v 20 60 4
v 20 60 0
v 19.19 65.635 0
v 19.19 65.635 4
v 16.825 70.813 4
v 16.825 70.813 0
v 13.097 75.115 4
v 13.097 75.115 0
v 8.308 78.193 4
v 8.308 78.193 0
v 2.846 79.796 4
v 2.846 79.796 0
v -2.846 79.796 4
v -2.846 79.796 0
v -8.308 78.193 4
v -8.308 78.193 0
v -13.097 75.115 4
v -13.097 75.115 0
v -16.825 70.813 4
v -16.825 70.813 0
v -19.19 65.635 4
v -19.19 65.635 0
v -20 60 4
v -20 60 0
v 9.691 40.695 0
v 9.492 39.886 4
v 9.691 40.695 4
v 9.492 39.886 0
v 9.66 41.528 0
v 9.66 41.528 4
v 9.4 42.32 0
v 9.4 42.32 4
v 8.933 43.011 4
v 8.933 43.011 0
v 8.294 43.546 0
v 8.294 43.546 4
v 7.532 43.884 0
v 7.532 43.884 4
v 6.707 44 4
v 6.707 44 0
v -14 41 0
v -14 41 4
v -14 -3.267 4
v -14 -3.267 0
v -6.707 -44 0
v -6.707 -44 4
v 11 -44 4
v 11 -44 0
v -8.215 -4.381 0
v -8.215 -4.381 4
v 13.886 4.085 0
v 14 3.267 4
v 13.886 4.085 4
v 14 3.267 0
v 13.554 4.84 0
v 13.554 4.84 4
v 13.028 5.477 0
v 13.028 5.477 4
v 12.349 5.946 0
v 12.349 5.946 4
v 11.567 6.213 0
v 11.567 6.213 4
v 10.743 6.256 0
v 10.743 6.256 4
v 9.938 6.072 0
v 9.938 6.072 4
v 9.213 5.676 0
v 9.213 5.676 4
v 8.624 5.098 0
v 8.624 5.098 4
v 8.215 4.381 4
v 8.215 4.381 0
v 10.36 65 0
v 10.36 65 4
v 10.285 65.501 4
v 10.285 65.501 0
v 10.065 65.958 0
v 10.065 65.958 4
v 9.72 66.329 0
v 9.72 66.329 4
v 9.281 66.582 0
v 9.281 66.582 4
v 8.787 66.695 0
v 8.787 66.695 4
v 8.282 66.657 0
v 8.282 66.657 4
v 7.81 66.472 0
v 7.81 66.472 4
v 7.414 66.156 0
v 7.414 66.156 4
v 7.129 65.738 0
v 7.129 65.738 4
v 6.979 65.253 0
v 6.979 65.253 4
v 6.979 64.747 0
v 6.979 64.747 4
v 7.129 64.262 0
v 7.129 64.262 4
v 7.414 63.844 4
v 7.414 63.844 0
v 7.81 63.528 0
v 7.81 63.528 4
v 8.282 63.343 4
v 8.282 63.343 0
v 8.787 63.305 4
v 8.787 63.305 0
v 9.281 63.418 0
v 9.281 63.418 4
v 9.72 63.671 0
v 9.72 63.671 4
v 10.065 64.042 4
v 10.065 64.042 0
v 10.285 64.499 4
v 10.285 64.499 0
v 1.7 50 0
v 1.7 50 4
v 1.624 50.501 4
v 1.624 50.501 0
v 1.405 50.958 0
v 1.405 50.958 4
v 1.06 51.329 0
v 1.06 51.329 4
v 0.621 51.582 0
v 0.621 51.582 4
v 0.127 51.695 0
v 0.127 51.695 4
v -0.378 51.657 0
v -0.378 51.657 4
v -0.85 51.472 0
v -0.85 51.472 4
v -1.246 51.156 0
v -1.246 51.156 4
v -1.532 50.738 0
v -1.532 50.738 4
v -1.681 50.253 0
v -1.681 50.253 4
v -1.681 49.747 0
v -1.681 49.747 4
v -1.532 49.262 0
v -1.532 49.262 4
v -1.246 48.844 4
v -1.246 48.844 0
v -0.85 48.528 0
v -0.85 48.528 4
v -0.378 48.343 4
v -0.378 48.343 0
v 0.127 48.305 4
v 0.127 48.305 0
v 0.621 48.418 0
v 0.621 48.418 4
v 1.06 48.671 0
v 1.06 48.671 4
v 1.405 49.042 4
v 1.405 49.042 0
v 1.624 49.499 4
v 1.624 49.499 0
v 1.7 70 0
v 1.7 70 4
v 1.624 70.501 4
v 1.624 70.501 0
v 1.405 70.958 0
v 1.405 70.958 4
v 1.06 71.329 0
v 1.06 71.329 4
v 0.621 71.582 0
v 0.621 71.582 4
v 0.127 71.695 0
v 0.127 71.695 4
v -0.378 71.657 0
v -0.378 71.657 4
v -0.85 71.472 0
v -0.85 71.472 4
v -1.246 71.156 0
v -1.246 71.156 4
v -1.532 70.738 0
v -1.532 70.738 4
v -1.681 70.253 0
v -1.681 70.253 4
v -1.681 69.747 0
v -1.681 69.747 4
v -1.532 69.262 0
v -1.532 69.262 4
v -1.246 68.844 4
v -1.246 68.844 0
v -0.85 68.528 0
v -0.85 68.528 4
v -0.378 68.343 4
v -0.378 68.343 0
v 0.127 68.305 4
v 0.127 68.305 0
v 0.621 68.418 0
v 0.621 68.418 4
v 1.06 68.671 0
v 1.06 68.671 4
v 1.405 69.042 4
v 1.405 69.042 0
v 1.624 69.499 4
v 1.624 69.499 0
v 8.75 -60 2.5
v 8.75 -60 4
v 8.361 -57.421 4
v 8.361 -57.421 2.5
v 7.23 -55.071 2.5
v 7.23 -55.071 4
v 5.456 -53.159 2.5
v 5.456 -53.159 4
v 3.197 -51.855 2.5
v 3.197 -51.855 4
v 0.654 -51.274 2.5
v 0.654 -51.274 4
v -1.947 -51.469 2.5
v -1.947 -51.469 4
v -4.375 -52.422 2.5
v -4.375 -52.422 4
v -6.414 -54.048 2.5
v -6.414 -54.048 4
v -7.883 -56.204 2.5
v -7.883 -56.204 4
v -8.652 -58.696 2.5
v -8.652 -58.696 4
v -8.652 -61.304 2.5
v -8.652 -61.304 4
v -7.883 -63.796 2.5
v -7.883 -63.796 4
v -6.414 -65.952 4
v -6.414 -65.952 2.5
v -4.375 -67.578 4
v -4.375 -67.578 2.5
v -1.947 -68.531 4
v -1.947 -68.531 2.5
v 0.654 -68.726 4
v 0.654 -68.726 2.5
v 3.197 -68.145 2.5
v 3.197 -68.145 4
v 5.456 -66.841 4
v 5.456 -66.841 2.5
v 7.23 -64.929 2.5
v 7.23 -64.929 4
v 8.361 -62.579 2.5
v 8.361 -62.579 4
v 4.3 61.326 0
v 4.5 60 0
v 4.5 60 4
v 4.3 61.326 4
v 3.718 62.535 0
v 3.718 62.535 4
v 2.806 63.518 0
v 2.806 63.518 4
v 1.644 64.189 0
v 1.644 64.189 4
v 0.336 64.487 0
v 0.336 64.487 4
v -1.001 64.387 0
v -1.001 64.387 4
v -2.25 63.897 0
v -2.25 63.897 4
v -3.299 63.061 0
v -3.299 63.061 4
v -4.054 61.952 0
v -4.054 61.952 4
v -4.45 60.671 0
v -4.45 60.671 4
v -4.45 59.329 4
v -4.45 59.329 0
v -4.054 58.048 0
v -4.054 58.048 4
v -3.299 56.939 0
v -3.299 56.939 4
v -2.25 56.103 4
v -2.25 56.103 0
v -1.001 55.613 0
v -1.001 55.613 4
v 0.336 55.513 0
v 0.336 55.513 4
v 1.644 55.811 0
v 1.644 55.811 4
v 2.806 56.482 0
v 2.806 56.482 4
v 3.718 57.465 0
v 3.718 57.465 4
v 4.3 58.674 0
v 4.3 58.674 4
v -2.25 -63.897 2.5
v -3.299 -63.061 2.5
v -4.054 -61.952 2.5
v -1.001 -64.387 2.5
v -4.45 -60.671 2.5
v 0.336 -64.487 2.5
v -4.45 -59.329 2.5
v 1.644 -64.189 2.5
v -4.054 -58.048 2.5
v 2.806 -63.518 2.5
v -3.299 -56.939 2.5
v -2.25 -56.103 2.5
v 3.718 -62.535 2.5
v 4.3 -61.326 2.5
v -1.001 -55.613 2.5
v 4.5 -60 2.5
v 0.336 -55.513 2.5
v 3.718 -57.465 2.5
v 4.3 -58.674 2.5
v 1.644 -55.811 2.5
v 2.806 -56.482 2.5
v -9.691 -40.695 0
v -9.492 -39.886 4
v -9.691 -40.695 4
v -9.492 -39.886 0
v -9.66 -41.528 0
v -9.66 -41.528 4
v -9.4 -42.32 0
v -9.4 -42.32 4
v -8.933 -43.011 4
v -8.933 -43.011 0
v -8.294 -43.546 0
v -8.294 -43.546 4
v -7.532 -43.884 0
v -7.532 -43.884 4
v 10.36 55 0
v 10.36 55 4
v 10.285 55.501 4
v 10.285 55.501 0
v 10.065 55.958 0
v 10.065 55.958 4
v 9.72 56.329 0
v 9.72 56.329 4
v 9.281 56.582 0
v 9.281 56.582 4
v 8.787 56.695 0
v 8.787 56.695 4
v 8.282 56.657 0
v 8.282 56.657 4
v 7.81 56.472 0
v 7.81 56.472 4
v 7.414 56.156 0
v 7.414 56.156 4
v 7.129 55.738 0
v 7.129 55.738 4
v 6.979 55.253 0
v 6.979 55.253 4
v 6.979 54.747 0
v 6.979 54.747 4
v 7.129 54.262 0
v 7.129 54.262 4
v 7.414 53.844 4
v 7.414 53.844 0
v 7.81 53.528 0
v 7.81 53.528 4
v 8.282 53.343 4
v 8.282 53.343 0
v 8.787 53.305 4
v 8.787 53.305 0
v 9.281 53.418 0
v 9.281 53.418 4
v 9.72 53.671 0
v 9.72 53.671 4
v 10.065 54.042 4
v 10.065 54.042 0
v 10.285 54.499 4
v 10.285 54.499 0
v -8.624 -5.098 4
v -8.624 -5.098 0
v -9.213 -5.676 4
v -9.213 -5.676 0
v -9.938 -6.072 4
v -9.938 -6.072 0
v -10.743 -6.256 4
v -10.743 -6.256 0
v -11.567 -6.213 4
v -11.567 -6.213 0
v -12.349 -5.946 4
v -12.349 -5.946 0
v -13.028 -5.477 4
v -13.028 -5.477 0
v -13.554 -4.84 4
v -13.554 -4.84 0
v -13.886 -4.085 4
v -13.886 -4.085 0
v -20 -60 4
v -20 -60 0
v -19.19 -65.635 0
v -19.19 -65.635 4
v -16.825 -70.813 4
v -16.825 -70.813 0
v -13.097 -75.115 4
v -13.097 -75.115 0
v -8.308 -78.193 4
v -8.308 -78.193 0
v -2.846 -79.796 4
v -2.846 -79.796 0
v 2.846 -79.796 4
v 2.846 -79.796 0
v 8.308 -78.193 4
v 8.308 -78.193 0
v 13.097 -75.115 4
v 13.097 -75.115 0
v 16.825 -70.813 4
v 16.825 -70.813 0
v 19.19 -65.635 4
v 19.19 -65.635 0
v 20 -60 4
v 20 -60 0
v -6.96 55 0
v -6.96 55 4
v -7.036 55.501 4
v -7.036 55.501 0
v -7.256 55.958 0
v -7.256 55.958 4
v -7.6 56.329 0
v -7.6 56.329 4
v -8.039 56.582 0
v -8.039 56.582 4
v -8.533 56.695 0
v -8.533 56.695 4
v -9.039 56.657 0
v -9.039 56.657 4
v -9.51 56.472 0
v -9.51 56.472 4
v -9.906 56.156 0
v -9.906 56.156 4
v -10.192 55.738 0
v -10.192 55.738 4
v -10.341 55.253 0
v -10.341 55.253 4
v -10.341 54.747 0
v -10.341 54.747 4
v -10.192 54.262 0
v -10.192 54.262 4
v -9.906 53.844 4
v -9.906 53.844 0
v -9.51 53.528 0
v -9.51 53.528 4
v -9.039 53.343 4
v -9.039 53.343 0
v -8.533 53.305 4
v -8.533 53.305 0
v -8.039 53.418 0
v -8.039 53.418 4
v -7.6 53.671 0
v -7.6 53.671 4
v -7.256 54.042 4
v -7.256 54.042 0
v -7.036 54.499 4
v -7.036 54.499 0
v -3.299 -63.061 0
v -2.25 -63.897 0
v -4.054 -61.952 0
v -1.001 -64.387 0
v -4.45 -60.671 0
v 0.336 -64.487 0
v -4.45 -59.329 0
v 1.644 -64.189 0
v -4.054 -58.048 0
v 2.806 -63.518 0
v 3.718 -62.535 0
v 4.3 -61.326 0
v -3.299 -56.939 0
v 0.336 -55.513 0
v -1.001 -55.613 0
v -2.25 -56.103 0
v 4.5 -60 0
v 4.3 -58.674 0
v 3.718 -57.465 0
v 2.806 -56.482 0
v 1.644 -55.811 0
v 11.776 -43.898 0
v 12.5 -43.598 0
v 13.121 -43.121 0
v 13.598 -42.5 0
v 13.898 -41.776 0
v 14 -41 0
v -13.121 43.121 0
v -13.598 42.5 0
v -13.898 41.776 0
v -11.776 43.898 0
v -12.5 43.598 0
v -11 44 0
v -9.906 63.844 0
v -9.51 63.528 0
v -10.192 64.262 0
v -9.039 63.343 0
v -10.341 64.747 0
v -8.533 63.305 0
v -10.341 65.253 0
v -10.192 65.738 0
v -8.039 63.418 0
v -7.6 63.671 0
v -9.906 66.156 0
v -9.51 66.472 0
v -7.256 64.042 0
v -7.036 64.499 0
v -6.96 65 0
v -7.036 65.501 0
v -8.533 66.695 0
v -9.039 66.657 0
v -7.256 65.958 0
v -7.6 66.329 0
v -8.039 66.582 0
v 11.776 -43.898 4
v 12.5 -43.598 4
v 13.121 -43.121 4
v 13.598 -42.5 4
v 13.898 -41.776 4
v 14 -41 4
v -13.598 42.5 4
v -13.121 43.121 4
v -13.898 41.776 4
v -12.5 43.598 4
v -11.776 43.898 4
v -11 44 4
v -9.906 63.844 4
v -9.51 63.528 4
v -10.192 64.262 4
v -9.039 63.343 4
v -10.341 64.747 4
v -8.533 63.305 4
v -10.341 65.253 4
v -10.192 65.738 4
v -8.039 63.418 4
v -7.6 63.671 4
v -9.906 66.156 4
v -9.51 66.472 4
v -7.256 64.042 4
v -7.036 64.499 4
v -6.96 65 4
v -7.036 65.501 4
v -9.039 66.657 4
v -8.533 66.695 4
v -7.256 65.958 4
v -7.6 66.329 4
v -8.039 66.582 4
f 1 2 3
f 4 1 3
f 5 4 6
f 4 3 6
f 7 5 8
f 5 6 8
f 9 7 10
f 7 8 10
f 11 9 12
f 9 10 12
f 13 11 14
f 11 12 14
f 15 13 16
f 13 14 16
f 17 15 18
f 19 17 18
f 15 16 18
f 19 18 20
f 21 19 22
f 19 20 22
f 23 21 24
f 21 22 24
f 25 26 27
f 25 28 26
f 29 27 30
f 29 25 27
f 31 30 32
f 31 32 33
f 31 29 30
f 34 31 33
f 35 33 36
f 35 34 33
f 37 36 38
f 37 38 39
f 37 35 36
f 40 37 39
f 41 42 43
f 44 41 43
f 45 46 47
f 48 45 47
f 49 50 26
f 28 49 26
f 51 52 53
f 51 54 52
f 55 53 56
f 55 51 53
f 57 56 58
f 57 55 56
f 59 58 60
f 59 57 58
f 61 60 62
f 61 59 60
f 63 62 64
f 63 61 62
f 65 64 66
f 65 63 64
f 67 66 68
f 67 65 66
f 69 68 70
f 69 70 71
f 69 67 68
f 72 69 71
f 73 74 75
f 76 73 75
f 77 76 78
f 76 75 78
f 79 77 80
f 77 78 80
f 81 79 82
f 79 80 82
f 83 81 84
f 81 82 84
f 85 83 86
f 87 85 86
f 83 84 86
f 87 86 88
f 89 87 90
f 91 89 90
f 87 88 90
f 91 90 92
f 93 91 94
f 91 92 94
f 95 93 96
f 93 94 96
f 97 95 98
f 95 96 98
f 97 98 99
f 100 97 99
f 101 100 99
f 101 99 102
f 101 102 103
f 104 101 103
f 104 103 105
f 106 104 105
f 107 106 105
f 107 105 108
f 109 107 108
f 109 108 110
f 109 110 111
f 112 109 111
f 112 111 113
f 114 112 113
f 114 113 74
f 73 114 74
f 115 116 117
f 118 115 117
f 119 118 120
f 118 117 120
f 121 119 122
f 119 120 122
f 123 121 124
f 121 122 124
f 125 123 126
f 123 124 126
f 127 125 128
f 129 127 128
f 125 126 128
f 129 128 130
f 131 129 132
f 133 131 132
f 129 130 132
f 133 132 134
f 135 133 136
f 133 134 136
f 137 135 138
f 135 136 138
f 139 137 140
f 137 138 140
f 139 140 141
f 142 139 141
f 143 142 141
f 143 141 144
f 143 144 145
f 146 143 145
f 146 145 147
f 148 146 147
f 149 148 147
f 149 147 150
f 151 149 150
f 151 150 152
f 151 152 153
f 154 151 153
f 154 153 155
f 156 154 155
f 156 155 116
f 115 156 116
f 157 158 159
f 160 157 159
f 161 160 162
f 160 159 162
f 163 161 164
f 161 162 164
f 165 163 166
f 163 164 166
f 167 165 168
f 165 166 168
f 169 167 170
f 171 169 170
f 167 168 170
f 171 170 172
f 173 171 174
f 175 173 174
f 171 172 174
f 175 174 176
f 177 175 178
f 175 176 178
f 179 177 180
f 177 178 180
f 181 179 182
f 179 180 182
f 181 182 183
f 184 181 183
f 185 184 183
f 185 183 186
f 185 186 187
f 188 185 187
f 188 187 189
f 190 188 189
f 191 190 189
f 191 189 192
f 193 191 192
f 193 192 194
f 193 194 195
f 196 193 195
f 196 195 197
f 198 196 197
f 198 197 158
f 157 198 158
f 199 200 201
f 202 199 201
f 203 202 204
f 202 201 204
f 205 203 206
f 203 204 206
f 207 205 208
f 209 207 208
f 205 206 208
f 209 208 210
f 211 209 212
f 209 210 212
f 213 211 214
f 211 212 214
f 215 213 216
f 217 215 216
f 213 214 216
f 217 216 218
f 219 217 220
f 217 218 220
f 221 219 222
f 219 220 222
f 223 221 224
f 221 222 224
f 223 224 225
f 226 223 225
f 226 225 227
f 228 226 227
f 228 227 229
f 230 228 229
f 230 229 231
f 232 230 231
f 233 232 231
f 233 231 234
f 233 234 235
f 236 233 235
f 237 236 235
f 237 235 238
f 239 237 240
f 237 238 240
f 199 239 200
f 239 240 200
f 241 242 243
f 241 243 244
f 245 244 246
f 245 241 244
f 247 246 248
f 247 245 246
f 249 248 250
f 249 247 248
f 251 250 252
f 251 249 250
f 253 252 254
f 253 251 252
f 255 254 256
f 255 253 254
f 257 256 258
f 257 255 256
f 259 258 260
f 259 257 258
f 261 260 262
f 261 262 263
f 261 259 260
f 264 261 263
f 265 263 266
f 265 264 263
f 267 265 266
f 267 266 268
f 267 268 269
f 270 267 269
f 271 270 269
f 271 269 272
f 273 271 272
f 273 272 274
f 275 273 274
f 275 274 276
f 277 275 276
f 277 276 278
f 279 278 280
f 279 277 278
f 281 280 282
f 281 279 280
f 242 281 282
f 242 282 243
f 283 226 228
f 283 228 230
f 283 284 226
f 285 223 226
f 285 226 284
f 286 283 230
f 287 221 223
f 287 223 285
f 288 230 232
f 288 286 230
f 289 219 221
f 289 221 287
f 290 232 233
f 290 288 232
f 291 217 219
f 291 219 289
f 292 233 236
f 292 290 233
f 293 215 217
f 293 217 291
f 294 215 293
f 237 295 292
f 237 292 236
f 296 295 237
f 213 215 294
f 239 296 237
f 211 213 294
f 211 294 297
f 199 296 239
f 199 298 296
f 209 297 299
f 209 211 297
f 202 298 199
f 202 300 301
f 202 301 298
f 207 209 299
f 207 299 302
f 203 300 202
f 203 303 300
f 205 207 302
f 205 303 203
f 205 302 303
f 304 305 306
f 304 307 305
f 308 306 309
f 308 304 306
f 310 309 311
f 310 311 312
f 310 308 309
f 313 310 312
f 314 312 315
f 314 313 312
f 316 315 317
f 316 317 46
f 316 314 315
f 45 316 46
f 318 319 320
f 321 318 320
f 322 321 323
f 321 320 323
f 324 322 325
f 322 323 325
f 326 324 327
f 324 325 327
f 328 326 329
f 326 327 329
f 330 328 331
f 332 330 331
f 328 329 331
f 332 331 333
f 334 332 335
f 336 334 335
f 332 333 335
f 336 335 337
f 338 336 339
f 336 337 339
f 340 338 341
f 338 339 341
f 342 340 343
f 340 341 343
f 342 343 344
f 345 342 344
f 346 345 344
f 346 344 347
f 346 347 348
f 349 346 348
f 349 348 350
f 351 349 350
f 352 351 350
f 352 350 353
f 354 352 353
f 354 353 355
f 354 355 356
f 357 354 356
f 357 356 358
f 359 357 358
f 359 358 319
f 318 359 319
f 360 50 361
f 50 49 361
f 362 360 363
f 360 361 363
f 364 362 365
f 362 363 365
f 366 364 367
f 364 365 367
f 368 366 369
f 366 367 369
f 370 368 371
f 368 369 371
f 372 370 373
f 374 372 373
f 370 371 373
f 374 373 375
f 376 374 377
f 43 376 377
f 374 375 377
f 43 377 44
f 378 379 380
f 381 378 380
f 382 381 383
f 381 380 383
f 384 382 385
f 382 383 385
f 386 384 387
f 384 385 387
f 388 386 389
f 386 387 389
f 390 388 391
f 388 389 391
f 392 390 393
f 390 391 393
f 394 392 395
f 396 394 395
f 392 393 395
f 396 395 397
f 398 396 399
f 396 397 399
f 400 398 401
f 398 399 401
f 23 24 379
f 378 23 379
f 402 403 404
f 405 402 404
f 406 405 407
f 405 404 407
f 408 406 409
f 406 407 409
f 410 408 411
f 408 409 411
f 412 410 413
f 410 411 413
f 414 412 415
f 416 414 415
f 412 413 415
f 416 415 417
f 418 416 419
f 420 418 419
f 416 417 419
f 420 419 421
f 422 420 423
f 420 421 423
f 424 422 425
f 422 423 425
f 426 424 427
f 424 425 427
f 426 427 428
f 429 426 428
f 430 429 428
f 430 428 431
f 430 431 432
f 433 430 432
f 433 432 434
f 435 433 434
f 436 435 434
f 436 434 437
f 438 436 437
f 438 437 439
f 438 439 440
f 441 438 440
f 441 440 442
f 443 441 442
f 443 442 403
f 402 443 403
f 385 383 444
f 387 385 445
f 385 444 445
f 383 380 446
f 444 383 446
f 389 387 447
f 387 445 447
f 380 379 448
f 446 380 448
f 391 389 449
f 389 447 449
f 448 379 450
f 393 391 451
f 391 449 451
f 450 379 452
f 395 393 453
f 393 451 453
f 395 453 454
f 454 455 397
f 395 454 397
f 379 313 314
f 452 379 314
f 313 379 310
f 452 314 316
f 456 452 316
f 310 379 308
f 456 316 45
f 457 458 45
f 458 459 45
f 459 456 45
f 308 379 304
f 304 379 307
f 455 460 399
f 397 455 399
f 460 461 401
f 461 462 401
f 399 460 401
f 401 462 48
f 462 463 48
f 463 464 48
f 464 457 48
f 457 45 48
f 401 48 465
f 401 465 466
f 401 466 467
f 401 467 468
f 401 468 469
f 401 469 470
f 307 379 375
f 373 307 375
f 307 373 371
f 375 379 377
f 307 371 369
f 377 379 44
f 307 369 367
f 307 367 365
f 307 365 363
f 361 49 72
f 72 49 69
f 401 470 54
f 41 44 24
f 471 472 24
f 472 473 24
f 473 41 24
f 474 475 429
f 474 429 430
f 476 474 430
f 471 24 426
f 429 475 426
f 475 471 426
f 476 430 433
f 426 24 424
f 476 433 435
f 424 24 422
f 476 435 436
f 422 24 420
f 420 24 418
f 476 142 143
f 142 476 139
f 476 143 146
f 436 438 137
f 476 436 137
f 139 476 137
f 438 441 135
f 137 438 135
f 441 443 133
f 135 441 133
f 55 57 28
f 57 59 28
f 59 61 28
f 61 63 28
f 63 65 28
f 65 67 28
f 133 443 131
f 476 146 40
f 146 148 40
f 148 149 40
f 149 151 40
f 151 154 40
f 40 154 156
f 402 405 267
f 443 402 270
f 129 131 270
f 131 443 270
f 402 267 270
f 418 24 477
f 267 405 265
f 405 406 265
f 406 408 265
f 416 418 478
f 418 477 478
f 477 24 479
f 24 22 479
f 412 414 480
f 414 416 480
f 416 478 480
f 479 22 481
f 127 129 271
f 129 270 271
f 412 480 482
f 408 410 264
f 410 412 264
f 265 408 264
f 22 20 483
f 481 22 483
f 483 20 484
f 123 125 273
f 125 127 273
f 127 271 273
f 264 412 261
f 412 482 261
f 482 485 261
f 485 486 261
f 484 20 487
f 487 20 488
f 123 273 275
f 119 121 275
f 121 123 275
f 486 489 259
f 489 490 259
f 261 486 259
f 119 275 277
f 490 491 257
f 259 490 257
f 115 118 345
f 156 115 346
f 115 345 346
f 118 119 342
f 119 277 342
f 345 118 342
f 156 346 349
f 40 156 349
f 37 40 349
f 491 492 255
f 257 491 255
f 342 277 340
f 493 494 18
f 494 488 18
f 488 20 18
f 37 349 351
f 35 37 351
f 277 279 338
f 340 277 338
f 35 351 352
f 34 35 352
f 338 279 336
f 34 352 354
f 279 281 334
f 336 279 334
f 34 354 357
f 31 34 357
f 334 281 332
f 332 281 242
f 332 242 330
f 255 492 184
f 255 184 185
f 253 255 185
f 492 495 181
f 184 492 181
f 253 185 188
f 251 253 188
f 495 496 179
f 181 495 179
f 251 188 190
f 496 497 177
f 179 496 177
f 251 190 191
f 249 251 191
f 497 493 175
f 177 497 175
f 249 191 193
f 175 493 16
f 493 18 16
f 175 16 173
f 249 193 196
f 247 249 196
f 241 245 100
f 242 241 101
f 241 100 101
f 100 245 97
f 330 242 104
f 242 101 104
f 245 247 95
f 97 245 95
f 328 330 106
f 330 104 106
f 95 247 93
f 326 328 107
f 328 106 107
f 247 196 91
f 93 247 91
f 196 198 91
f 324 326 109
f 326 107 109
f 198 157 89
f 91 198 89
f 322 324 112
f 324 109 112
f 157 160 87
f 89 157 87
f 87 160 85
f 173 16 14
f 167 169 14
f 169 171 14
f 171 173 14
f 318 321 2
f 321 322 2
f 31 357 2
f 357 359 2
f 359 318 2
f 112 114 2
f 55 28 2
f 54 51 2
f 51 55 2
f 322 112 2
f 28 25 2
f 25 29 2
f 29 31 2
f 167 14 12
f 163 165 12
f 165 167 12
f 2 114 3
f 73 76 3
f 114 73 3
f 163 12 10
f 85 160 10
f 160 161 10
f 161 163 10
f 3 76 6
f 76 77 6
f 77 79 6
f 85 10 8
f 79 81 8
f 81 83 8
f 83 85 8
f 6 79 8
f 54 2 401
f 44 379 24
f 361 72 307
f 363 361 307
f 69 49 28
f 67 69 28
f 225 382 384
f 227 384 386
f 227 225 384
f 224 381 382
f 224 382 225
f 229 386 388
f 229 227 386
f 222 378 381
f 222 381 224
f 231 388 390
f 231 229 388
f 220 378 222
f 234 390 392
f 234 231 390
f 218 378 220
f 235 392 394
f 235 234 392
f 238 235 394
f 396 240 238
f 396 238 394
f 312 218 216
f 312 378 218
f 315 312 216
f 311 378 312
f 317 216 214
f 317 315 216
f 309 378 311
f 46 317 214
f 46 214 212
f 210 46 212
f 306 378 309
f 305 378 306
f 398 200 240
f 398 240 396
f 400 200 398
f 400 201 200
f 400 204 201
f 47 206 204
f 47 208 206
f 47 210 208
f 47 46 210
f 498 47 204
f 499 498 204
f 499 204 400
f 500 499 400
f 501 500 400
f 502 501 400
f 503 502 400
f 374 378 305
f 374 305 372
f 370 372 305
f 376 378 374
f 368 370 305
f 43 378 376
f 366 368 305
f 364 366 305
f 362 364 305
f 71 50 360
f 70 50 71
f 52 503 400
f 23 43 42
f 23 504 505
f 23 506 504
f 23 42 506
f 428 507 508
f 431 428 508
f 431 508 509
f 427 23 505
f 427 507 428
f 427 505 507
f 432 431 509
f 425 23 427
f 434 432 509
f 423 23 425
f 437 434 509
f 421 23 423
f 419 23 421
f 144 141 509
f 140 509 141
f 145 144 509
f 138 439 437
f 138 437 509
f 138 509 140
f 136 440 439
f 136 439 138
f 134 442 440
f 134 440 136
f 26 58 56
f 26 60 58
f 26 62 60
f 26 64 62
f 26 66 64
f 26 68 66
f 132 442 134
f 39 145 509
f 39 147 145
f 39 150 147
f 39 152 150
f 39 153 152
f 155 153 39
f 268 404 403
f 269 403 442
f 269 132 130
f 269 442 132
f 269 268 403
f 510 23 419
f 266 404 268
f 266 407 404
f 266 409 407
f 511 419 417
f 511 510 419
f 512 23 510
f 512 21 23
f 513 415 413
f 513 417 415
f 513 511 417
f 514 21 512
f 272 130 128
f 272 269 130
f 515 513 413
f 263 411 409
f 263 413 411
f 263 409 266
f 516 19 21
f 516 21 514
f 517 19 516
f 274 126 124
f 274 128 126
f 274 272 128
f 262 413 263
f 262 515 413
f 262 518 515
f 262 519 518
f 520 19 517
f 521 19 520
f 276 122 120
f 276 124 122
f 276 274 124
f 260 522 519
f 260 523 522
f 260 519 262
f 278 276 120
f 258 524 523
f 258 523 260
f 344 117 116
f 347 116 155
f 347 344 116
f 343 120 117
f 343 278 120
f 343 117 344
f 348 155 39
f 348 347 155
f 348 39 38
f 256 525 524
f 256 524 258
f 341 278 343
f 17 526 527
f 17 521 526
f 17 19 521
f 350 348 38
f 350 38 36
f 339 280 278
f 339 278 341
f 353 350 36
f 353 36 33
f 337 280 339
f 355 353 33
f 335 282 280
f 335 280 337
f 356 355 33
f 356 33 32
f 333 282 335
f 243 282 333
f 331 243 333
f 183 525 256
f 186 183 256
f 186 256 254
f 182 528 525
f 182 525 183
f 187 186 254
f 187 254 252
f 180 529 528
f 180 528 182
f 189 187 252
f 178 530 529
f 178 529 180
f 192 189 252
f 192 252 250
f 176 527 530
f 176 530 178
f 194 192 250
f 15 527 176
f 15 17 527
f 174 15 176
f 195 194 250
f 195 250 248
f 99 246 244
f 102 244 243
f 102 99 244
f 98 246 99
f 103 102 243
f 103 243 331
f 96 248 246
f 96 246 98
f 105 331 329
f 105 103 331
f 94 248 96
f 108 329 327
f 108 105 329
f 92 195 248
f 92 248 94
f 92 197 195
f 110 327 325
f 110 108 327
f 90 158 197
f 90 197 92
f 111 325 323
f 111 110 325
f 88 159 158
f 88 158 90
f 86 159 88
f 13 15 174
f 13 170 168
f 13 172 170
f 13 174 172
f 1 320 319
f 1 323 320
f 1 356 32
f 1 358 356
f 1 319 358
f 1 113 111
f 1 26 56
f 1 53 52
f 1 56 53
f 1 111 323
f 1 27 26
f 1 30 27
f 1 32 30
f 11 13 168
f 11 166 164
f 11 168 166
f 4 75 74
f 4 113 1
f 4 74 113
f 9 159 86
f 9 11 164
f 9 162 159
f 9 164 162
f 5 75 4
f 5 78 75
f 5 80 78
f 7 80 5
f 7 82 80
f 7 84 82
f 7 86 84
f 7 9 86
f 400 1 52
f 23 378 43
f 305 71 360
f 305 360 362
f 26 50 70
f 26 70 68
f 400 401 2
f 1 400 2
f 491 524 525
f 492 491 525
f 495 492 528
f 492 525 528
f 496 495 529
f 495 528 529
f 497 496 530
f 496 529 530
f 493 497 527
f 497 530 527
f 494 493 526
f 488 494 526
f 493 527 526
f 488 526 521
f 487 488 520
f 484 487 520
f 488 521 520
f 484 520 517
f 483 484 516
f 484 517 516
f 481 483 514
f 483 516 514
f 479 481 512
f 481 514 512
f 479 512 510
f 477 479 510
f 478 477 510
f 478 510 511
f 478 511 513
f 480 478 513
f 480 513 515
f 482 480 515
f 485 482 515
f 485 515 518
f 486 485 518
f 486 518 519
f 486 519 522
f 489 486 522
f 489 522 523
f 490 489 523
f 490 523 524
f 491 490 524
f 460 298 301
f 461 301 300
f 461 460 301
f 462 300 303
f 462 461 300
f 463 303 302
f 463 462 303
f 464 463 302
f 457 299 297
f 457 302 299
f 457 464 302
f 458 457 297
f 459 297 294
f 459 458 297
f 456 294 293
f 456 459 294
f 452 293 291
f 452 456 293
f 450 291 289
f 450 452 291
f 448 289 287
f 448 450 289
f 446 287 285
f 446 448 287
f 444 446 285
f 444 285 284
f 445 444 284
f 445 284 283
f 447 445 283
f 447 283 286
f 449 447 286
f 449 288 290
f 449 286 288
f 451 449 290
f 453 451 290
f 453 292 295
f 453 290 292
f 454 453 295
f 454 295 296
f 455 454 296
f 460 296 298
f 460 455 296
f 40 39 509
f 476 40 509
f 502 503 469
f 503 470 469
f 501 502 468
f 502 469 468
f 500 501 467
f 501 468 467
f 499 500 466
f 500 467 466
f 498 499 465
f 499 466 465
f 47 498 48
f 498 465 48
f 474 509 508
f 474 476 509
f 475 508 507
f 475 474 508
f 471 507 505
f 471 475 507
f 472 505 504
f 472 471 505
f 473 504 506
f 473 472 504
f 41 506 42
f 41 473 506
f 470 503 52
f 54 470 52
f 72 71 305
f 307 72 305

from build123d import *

# Parameters (mm, degrees)
SKETCH_1_R          = 4.5
EXTRUDE_2_DEPTH     = 4
CUT_EXTRUDE_1_DEPTH = 83.559069762
FILLET_1_R          = 3
SKETCH_6_R          = 1.7
CUT_EXTRUDE_2_DEPTH = 83.559069762
SKETCH_7_R          = 8.75
CUT_EXTRUDE_3_DEPTH = 1.5


with BuildPart() as part:
    # 草图1 → 凸台-拉伸2 (new body)
    with BuildSketch(Plane.XY):
        with BuildLine():
            Line((20, -60), (20, 60))
            ThreePointArc((20, 60), (0, 80), (-20, 60))
            Line((-20, 60), (-20, -60))
            ThreePointArc((-20, -60), (0, -80), (20, -60))
        make_face()
        with Locations((0, 60)):
            Circle(SKETCH_1_R, mode=Mode.SUBTRACT)
        with Locations((0, -60)):
            Circle(SKETCH_1_R, mode=Mode.SUBTRACT)
    extrude(amount=EXTRUDE_2_DEPTH)

    # 草图4 → 切除-拉伸1 (cut, through all)
    with BuildSketch(Plane.XY.offset(4)):
        Polygon((-14, -18.844505579), (11.137802231, 44), (-14, 44), align=None)
        Polygon((14, -44), (14, 18.844505579), (-11.137802231, -44), align=None)
    extrude(amount=-CUT_EXTRUDE_1_DEPTH, mode=Mode.SUBTRACT)

    # 圆角1
    fillet_1_edges = [part.edges().sort_by_distance(p)[0] for p in [
        (14, -44, 2),
        (-11.137802231, -44, 2),
        (14, 18.844505579, 2),
        (-14, -18.844505579, 2),
        (-14, 44, 2),
        (11.137802231, 44, 2),
    ]]
    fillet(fillet_1_edges, radius=FILLET_1_R)

    # 草图6 → 切除-拉伸2 (cut, through all)
    with BuildSketch(Plane.XY.offset(4)):
        with Locations((0, 50)):
            Circle(SKETCH_6_R)
        with Locations((-8.660254038, 55)):
            Circle(SKETCH_6_R)
        with Locations((-8.660254038, 65)):
            Circle(SKETCH_6_R)
        with Locations((0, 70)):
            Circle(SKETCH_6_R)
        with Locations((8.660254038, 65)):
            Circle(SKETCH_6_R)
        with Locations((8.660254038, 55)):
            Circle(SKETCH_6_R)
    extrude(amount=-CUT_EXTRUDE_2_DEPTH, mode=Mode.SUBTRACT)

    # 草图7 → 切除-拉伸3 (cut)
    with BuildSketch(Plane.XY.offset(4)):
        with Locations((0, -60)):
            Circle(SKETCH_7_R)
    extrude(amount=-CUT_EXTRUDE_3_DEPTH, mode=Mode.SUBTRACT)


solid = part.part
